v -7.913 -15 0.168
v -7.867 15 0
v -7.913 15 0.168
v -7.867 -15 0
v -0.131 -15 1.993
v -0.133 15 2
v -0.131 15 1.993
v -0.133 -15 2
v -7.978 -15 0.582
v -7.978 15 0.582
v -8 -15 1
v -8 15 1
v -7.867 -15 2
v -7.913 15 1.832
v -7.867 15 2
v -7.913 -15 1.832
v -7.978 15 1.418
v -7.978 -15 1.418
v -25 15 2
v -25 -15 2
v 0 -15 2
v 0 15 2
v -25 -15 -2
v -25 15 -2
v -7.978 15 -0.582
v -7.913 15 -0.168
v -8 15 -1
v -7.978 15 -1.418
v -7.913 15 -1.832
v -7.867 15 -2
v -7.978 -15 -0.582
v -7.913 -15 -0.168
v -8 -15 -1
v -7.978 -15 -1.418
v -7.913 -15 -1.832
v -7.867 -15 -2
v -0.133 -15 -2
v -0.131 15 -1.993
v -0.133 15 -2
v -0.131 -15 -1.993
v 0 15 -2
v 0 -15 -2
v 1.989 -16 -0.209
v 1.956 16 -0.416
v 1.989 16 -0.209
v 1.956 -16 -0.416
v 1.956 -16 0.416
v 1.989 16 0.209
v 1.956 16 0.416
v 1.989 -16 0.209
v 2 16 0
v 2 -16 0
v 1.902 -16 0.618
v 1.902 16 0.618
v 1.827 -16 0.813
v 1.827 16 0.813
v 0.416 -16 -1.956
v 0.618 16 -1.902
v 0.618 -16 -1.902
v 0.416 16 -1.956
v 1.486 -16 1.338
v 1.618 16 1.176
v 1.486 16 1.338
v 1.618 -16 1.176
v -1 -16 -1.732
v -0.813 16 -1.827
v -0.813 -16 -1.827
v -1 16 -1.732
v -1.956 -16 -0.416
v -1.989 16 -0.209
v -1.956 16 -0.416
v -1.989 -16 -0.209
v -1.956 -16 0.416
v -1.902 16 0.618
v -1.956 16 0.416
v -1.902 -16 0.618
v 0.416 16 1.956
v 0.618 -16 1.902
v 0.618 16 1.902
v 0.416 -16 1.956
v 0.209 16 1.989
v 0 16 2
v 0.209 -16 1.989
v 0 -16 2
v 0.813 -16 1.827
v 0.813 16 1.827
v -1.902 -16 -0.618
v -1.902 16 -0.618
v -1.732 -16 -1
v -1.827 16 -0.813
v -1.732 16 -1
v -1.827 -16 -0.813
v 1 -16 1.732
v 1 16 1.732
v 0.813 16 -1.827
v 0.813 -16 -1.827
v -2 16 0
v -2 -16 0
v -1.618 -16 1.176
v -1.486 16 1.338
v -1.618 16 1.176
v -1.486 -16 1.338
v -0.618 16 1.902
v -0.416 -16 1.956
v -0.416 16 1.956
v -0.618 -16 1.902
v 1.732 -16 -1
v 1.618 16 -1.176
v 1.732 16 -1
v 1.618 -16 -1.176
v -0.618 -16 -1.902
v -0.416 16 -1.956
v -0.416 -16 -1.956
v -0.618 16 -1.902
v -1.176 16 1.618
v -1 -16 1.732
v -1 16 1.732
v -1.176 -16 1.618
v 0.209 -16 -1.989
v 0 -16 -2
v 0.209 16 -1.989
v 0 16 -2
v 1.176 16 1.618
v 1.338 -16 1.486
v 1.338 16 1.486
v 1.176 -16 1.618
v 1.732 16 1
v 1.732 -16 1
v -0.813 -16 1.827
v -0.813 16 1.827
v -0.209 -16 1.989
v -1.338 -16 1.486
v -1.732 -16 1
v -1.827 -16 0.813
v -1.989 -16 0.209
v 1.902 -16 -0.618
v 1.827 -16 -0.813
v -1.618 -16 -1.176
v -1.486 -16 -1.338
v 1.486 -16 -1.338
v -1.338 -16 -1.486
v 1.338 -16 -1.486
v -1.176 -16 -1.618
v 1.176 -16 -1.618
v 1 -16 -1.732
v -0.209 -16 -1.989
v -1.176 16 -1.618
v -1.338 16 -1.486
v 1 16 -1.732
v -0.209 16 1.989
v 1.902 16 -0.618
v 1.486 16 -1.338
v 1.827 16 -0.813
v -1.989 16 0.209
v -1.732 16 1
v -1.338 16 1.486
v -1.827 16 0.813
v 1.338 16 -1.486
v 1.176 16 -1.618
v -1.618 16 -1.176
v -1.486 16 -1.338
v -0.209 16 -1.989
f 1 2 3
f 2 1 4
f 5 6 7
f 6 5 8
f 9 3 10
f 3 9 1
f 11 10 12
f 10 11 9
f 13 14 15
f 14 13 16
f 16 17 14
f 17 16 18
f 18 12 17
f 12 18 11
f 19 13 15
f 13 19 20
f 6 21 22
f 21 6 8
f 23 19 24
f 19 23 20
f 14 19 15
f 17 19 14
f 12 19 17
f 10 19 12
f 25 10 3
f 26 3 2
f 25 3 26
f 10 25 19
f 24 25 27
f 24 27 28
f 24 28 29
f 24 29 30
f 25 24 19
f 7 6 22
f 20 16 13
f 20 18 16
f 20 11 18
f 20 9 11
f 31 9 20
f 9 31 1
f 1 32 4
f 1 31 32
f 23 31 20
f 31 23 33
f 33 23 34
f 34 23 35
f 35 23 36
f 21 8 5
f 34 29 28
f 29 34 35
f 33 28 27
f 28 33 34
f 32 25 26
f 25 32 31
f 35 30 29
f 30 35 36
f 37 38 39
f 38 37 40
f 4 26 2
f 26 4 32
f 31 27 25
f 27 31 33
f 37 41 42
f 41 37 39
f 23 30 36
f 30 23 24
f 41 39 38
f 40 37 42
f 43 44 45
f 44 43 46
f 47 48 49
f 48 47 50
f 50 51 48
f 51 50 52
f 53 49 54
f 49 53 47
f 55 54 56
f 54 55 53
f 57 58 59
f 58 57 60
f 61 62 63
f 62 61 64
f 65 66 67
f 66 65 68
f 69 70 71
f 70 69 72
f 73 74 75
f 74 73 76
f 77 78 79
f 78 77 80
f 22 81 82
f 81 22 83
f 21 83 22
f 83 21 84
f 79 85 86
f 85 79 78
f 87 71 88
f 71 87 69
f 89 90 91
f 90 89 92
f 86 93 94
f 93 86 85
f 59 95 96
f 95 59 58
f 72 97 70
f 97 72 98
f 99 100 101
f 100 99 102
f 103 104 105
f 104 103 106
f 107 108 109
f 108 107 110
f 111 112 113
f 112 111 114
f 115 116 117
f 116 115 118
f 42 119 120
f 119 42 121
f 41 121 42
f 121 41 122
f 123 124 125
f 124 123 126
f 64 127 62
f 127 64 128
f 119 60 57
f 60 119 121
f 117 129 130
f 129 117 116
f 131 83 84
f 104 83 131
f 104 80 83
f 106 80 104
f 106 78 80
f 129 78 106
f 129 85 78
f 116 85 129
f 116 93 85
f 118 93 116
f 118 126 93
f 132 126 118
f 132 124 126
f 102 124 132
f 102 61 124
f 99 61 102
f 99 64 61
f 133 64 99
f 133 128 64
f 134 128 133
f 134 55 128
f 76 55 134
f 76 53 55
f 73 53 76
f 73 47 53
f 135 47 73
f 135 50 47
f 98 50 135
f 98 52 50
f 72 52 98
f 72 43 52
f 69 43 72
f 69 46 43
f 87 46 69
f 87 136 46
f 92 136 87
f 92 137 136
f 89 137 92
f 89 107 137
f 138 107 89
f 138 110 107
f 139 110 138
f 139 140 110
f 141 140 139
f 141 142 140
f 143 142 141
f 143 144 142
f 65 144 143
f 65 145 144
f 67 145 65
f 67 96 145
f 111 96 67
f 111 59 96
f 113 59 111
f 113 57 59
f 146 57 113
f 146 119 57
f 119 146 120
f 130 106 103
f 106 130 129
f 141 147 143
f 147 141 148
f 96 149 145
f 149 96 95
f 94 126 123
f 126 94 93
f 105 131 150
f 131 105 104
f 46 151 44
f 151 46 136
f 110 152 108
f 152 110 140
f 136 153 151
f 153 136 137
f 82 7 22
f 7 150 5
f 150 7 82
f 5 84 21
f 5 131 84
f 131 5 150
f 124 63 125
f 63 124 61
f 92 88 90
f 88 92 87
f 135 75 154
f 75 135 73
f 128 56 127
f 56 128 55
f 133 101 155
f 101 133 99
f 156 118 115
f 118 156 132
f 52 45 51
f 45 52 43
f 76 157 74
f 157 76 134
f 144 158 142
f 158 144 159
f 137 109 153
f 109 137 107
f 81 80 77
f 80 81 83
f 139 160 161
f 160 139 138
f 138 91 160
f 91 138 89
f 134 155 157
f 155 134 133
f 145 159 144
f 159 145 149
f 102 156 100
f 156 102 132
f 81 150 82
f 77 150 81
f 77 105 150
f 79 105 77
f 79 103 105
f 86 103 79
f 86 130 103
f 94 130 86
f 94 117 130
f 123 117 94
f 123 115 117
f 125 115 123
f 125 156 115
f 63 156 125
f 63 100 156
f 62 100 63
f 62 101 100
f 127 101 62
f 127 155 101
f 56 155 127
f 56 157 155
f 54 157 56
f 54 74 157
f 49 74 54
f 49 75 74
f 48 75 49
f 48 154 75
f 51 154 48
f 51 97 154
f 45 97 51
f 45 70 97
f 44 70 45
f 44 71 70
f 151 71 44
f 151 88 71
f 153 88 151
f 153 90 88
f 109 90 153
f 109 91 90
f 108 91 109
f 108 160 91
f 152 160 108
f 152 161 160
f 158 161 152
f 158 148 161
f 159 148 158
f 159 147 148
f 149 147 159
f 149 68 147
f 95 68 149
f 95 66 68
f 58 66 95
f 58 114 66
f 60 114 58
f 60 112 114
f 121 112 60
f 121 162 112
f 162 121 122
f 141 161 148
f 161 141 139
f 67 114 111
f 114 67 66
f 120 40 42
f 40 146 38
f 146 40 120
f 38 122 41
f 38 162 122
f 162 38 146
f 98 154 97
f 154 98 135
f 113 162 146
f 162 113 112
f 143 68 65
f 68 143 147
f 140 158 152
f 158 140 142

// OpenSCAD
// OpenSCAD: 改善版 butt hinge (180° 開き) - 左板/右板/ピン軸
// 寸法は元の指示に準拠: 左右板 30x25x2, ピン軸 Ø4, 全体 knuckle Ø8, 内径 Ø4.6 (ピン間隙 0.3mm クリアランス)
// knuckle は縦方向 Y に 6mm刻み、左3個・右2個、左右別々の位置に配置
// 左板 x<0, 右板 x>0, 開いた状態は Y 軸中心線を共有して同一平面

// 板の基本寸法
leaf_W = 25;
leaf_H = 30;
leaf_T = 2;

// knuckle/ピンの寸法
knuckle_OD = 8;        // 外径
knuckle_R  = knuckle_OD/2;
pin_D      = 4;        // ピン径
pin_R      = pin_D/2;
hole_d     = 4.6;      // knuckle 内径 (ピン間隙)
hole_R     = hole_d/2;

// knuckle の配置（Y軸方向に 6mmごとに分割）
left_knuckles_Y  = [-12, 0, 12]; // 左板: 外側2個 + 中央1個
right_knuckles_Y = [-6, 6];      // 右板: 中間2個

// 左右板それぞれの knuckle から離れた側の皿穴（M3）位置
// 穴ピッチ 8mm（縦方向）、直径6mmのテーパ+ 直径3.2mm 貫通穴
// テーパはTop面近傍1mm深さ
M3_pocket_Y_left  = [-12, -4, 4];
M3_pocket_Y_right = [-6, 0, 6];

// 内部ヘルパー: knuckle（左用/右用）を X 軸正方向または負方向に配置
module left_knuckle(y) {
    translate([-4, y, 1])
        rotate([90, 0, 0])
            cylinder(h = leaf_H, r = knuckle_R, center = true);
}
module right_knuckle(y) {
    translate([4, y, 1])
        rotate([90, 0, 0])
            cylinder(h = leaf_H, r = knuckle_R, center = true);
}

// M3皿穴の実装（ countersink + through hole ）
module m3_hole_at(x, y) {
    // countersink (6mm diam, depth 1mm from top surface)
    // 上面は z = leaf_T、下は z = leaf_T - 1
    translate([x, y, leaf_T - 1])
        cylinder(h = 1, r1 = 3, r2 = 0, center = false);

    // 貫通穴 (3.2mm dia) 貫通高さは板厚分
    translate([x, y, 0])
        cylinder(h = leaf_T, r = 1.6, center = false);
}

// 左板 (X < 0)
module left_leaf() {
    difference() {
        // 左板: 原点基準で -25 <= X <= 0
        translate([-25, -15, 0])
            cube([25, 30, 2], center = false);

        // knuckle（左板 / 左側の外側2個 + 中央1個）
        for (y = left_knuckles_Y)
            left_knuckle(y);

        // knuckle から離れた側の M3皿穴
        for (y = M3_pocket_Y_left)
            m3_hole_at(-4, y);
    }
}

// 右板 (X > 0)
module right_leaf() {
    difference() {
        // 右板: 0 <= X <= 25
        translate([0, -15, 0])
            cube([25, 30, 2], center = false);

        // knuckle（右板 / 中間2個）
        for (y = right_knuckles_Y)
            right_knuckle(y);

        // knuckle から離れた側の M3皿穴
        for (y = M3_pocket_Y_right)
            m3_hole_at(4, y);
    }
}

// ピン軸（Y軸方向、+Y方向）
// 開いた状態では両板の平面が一致するよう、X=0 の中心線を通る
module pin_axis() {
    // Z軸方向の円柱をY軸方向に回転して配置
    rotate([90, 0, 0])
        cylinder(h = 32, r = pin_R, center = true);
}

// 完成品: 180° 開いた状態で配置
module hinge_open_state() {
    union() {
        left_leaf();
        rotate([0, 180, 0])
            right_leaf();
        pin_axis();
    }
}

// 解像度
$fn = 60;

// 出力
hinge_open_state();
